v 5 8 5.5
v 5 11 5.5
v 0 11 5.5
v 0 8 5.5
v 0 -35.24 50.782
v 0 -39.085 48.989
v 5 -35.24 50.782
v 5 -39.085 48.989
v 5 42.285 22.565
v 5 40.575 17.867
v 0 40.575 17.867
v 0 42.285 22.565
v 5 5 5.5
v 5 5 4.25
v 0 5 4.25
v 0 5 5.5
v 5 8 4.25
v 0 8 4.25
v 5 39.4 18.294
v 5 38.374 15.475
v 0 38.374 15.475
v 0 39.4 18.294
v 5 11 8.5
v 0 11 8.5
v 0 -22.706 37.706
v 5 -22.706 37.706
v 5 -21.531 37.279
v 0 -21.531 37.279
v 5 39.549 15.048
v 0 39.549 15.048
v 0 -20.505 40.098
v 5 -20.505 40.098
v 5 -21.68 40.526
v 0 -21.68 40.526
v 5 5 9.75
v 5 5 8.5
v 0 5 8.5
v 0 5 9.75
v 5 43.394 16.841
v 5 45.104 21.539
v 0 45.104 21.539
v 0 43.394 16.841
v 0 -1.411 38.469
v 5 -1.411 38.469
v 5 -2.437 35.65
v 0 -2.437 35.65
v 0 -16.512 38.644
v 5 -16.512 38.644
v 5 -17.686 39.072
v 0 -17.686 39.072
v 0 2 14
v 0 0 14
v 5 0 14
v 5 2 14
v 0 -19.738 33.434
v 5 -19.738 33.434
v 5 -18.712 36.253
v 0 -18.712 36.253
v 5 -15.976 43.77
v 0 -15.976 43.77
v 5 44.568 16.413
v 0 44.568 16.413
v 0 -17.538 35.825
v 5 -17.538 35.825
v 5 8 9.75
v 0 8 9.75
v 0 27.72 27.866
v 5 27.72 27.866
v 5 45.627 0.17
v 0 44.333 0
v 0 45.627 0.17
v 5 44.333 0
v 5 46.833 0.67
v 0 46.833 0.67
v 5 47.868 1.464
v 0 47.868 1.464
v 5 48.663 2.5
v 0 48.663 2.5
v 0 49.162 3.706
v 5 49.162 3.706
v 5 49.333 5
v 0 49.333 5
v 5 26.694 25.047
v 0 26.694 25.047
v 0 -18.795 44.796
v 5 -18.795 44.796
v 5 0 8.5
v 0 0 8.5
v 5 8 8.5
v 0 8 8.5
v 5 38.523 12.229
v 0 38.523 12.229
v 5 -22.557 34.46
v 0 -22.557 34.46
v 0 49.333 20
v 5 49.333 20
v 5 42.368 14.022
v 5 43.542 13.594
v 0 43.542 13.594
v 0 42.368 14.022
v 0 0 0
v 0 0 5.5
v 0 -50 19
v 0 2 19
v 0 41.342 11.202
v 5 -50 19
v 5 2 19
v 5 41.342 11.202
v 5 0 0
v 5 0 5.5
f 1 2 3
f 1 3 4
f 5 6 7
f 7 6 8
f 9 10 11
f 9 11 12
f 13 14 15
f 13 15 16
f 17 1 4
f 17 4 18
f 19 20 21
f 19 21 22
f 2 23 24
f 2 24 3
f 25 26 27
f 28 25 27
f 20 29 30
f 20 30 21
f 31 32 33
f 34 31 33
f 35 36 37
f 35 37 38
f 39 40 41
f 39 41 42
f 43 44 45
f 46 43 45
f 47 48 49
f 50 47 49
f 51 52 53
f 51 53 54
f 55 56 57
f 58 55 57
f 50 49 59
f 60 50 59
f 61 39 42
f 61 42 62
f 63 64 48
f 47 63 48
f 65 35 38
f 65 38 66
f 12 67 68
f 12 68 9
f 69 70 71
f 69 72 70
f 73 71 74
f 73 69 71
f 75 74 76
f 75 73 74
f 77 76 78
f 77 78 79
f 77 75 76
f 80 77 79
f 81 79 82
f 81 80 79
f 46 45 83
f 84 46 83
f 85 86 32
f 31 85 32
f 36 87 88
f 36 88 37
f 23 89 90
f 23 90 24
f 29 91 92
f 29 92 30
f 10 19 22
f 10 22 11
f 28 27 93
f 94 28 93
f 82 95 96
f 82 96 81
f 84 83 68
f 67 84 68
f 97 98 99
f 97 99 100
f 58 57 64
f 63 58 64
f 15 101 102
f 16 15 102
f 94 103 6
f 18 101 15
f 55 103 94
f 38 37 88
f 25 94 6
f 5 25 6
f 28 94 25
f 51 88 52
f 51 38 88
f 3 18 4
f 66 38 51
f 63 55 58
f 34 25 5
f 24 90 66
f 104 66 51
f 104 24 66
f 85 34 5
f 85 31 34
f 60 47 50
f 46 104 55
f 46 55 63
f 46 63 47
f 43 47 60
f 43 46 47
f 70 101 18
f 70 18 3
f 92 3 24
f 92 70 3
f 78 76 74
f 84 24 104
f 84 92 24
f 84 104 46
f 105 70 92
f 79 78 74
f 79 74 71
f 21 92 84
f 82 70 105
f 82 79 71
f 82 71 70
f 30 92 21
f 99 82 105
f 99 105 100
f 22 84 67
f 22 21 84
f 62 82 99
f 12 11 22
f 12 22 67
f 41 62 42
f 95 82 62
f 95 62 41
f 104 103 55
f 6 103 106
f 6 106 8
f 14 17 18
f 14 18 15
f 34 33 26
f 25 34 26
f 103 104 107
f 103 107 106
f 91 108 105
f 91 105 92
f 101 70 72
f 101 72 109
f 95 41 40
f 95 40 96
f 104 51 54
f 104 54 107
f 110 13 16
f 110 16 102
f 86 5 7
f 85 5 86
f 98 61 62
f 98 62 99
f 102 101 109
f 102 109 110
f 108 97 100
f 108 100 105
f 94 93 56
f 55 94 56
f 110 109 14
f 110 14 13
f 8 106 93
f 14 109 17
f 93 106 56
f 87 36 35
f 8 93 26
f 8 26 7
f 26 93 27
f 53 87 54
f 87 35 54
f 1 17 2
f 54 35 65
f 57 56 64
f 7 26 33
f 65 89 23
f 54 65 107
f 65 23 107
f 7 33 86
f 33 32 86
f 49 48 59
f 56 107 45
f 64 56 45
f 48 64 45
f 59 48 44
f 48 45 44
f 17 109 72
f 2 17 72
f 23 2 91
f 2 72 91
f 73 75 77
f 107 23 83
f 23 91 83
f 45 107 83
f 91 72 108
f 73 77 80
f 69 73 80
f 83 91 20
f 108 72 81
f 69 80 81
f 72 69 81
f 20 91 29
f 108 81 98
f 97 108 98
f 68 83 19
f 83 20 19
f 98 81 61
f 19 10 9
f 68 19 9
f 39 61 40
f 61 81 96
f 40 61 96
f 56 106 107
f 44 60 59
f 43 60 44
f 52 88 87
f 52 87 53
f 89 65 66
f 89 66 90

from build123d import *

# Parameters (mm, degrees)
BOSS_EXTRUDE1_DEPTH = 5
CUT_EXTRUDE1_DEPTH  = 73.173788448
CHAMFER1_SIZE       = 3
FILLET1_R           = 5


with BuildPart() as part:
    # Sketch1 → Boss-Extrude1 (new body)
    with BuildSketch(Plane(origin=(0, 0, 0), x_dir=(0, 0, -1), z_dir=(1, 0, 0))):
        Polygon((0, 0), (-14, 0), (-14, 2), (-19, 2), (-19, -50), (-51.807873329, -38.058910659), (-20, 49.332503075), (0, 49.332503075), align=None)
    extrude(amount=BOSS_EXTRUDE1_DEPTH)

    # Sketch2 → Cut-Extrude1 (cut, through all)
    with BuildSketch(Plane(origin=(5, 0, 0), x_dir=(0, 0, -1), z_dir=(1, 0, 0))):
        Polygon((-21.539090645, 45.103886281), (-16.840627541, 43.393785564), (-16.413102362, 44.56840134), (-13.5940245, 43.54234091), (-14.021549679, 42.367725134), (-11.202471816, 41.341664704), (-12.228532246, 38.522586842), (-15.047610109, 39.548647272), (-15.475135288, 38.374031496), (-18.29421315, 39.400091926), (-17.866687971, 40.574707702), (-22.565151075, 42.284808419), align=None)
        Polygon((-43.770399961, -15.97613407), (-44.796460391, -18.795211932), (-40.097997287, -20.505312649), (-40.525522466, -21.679928425), (-37.706444604, -22.705988855), (-37.278919425, -21.531373079), (-34.459841562, -22.557433509), (-33.433781132, -19.738355647), (-36.252858995, -18.712295217), (-35.825333816, -17.537679441), (-38.644411678, -16.511619011), (-39.071936857, -17.686234787), align=None)
        Polygon((-27.866463296, 27.719572796), (-38.46908774, -1.410898448), (-35.650009877, -2.436958878), (-25.047385434, 26.693512366), align=None)
        Polygon((-8.5, 0), (-8.5, 5), (-9.75, 5), (-9.75, 8), (-8.5, 8), (-8.5, 11), (-5.5, 11), (-5.5, 8), (-4.25, 8), (-4.25, 5), (-5.5, 5), (-5.5, 0), align=None)
    extrude(amount=-CUT_EXTRUDE1_DEPTH, mode=Mode.SUBTRACT)

    # Chamfer1
    chamfer1_edges = [part.edges().sort_by_distance(p)[0] for p in [
        (2.5, -38.058910659, 51.807873329),
    ]]
    chamfer(chamfer1_edges, length=CHAMFER1_SIZE)

    # Fillet1
    fillet1_edges = [part.edges().sort_by_distance(p)[0] for p in [
        (2.5, 49.332503075, 0),
    ]]
    fillet(fillet1_edges, radius=FILLET1_R)


solid = part.part
